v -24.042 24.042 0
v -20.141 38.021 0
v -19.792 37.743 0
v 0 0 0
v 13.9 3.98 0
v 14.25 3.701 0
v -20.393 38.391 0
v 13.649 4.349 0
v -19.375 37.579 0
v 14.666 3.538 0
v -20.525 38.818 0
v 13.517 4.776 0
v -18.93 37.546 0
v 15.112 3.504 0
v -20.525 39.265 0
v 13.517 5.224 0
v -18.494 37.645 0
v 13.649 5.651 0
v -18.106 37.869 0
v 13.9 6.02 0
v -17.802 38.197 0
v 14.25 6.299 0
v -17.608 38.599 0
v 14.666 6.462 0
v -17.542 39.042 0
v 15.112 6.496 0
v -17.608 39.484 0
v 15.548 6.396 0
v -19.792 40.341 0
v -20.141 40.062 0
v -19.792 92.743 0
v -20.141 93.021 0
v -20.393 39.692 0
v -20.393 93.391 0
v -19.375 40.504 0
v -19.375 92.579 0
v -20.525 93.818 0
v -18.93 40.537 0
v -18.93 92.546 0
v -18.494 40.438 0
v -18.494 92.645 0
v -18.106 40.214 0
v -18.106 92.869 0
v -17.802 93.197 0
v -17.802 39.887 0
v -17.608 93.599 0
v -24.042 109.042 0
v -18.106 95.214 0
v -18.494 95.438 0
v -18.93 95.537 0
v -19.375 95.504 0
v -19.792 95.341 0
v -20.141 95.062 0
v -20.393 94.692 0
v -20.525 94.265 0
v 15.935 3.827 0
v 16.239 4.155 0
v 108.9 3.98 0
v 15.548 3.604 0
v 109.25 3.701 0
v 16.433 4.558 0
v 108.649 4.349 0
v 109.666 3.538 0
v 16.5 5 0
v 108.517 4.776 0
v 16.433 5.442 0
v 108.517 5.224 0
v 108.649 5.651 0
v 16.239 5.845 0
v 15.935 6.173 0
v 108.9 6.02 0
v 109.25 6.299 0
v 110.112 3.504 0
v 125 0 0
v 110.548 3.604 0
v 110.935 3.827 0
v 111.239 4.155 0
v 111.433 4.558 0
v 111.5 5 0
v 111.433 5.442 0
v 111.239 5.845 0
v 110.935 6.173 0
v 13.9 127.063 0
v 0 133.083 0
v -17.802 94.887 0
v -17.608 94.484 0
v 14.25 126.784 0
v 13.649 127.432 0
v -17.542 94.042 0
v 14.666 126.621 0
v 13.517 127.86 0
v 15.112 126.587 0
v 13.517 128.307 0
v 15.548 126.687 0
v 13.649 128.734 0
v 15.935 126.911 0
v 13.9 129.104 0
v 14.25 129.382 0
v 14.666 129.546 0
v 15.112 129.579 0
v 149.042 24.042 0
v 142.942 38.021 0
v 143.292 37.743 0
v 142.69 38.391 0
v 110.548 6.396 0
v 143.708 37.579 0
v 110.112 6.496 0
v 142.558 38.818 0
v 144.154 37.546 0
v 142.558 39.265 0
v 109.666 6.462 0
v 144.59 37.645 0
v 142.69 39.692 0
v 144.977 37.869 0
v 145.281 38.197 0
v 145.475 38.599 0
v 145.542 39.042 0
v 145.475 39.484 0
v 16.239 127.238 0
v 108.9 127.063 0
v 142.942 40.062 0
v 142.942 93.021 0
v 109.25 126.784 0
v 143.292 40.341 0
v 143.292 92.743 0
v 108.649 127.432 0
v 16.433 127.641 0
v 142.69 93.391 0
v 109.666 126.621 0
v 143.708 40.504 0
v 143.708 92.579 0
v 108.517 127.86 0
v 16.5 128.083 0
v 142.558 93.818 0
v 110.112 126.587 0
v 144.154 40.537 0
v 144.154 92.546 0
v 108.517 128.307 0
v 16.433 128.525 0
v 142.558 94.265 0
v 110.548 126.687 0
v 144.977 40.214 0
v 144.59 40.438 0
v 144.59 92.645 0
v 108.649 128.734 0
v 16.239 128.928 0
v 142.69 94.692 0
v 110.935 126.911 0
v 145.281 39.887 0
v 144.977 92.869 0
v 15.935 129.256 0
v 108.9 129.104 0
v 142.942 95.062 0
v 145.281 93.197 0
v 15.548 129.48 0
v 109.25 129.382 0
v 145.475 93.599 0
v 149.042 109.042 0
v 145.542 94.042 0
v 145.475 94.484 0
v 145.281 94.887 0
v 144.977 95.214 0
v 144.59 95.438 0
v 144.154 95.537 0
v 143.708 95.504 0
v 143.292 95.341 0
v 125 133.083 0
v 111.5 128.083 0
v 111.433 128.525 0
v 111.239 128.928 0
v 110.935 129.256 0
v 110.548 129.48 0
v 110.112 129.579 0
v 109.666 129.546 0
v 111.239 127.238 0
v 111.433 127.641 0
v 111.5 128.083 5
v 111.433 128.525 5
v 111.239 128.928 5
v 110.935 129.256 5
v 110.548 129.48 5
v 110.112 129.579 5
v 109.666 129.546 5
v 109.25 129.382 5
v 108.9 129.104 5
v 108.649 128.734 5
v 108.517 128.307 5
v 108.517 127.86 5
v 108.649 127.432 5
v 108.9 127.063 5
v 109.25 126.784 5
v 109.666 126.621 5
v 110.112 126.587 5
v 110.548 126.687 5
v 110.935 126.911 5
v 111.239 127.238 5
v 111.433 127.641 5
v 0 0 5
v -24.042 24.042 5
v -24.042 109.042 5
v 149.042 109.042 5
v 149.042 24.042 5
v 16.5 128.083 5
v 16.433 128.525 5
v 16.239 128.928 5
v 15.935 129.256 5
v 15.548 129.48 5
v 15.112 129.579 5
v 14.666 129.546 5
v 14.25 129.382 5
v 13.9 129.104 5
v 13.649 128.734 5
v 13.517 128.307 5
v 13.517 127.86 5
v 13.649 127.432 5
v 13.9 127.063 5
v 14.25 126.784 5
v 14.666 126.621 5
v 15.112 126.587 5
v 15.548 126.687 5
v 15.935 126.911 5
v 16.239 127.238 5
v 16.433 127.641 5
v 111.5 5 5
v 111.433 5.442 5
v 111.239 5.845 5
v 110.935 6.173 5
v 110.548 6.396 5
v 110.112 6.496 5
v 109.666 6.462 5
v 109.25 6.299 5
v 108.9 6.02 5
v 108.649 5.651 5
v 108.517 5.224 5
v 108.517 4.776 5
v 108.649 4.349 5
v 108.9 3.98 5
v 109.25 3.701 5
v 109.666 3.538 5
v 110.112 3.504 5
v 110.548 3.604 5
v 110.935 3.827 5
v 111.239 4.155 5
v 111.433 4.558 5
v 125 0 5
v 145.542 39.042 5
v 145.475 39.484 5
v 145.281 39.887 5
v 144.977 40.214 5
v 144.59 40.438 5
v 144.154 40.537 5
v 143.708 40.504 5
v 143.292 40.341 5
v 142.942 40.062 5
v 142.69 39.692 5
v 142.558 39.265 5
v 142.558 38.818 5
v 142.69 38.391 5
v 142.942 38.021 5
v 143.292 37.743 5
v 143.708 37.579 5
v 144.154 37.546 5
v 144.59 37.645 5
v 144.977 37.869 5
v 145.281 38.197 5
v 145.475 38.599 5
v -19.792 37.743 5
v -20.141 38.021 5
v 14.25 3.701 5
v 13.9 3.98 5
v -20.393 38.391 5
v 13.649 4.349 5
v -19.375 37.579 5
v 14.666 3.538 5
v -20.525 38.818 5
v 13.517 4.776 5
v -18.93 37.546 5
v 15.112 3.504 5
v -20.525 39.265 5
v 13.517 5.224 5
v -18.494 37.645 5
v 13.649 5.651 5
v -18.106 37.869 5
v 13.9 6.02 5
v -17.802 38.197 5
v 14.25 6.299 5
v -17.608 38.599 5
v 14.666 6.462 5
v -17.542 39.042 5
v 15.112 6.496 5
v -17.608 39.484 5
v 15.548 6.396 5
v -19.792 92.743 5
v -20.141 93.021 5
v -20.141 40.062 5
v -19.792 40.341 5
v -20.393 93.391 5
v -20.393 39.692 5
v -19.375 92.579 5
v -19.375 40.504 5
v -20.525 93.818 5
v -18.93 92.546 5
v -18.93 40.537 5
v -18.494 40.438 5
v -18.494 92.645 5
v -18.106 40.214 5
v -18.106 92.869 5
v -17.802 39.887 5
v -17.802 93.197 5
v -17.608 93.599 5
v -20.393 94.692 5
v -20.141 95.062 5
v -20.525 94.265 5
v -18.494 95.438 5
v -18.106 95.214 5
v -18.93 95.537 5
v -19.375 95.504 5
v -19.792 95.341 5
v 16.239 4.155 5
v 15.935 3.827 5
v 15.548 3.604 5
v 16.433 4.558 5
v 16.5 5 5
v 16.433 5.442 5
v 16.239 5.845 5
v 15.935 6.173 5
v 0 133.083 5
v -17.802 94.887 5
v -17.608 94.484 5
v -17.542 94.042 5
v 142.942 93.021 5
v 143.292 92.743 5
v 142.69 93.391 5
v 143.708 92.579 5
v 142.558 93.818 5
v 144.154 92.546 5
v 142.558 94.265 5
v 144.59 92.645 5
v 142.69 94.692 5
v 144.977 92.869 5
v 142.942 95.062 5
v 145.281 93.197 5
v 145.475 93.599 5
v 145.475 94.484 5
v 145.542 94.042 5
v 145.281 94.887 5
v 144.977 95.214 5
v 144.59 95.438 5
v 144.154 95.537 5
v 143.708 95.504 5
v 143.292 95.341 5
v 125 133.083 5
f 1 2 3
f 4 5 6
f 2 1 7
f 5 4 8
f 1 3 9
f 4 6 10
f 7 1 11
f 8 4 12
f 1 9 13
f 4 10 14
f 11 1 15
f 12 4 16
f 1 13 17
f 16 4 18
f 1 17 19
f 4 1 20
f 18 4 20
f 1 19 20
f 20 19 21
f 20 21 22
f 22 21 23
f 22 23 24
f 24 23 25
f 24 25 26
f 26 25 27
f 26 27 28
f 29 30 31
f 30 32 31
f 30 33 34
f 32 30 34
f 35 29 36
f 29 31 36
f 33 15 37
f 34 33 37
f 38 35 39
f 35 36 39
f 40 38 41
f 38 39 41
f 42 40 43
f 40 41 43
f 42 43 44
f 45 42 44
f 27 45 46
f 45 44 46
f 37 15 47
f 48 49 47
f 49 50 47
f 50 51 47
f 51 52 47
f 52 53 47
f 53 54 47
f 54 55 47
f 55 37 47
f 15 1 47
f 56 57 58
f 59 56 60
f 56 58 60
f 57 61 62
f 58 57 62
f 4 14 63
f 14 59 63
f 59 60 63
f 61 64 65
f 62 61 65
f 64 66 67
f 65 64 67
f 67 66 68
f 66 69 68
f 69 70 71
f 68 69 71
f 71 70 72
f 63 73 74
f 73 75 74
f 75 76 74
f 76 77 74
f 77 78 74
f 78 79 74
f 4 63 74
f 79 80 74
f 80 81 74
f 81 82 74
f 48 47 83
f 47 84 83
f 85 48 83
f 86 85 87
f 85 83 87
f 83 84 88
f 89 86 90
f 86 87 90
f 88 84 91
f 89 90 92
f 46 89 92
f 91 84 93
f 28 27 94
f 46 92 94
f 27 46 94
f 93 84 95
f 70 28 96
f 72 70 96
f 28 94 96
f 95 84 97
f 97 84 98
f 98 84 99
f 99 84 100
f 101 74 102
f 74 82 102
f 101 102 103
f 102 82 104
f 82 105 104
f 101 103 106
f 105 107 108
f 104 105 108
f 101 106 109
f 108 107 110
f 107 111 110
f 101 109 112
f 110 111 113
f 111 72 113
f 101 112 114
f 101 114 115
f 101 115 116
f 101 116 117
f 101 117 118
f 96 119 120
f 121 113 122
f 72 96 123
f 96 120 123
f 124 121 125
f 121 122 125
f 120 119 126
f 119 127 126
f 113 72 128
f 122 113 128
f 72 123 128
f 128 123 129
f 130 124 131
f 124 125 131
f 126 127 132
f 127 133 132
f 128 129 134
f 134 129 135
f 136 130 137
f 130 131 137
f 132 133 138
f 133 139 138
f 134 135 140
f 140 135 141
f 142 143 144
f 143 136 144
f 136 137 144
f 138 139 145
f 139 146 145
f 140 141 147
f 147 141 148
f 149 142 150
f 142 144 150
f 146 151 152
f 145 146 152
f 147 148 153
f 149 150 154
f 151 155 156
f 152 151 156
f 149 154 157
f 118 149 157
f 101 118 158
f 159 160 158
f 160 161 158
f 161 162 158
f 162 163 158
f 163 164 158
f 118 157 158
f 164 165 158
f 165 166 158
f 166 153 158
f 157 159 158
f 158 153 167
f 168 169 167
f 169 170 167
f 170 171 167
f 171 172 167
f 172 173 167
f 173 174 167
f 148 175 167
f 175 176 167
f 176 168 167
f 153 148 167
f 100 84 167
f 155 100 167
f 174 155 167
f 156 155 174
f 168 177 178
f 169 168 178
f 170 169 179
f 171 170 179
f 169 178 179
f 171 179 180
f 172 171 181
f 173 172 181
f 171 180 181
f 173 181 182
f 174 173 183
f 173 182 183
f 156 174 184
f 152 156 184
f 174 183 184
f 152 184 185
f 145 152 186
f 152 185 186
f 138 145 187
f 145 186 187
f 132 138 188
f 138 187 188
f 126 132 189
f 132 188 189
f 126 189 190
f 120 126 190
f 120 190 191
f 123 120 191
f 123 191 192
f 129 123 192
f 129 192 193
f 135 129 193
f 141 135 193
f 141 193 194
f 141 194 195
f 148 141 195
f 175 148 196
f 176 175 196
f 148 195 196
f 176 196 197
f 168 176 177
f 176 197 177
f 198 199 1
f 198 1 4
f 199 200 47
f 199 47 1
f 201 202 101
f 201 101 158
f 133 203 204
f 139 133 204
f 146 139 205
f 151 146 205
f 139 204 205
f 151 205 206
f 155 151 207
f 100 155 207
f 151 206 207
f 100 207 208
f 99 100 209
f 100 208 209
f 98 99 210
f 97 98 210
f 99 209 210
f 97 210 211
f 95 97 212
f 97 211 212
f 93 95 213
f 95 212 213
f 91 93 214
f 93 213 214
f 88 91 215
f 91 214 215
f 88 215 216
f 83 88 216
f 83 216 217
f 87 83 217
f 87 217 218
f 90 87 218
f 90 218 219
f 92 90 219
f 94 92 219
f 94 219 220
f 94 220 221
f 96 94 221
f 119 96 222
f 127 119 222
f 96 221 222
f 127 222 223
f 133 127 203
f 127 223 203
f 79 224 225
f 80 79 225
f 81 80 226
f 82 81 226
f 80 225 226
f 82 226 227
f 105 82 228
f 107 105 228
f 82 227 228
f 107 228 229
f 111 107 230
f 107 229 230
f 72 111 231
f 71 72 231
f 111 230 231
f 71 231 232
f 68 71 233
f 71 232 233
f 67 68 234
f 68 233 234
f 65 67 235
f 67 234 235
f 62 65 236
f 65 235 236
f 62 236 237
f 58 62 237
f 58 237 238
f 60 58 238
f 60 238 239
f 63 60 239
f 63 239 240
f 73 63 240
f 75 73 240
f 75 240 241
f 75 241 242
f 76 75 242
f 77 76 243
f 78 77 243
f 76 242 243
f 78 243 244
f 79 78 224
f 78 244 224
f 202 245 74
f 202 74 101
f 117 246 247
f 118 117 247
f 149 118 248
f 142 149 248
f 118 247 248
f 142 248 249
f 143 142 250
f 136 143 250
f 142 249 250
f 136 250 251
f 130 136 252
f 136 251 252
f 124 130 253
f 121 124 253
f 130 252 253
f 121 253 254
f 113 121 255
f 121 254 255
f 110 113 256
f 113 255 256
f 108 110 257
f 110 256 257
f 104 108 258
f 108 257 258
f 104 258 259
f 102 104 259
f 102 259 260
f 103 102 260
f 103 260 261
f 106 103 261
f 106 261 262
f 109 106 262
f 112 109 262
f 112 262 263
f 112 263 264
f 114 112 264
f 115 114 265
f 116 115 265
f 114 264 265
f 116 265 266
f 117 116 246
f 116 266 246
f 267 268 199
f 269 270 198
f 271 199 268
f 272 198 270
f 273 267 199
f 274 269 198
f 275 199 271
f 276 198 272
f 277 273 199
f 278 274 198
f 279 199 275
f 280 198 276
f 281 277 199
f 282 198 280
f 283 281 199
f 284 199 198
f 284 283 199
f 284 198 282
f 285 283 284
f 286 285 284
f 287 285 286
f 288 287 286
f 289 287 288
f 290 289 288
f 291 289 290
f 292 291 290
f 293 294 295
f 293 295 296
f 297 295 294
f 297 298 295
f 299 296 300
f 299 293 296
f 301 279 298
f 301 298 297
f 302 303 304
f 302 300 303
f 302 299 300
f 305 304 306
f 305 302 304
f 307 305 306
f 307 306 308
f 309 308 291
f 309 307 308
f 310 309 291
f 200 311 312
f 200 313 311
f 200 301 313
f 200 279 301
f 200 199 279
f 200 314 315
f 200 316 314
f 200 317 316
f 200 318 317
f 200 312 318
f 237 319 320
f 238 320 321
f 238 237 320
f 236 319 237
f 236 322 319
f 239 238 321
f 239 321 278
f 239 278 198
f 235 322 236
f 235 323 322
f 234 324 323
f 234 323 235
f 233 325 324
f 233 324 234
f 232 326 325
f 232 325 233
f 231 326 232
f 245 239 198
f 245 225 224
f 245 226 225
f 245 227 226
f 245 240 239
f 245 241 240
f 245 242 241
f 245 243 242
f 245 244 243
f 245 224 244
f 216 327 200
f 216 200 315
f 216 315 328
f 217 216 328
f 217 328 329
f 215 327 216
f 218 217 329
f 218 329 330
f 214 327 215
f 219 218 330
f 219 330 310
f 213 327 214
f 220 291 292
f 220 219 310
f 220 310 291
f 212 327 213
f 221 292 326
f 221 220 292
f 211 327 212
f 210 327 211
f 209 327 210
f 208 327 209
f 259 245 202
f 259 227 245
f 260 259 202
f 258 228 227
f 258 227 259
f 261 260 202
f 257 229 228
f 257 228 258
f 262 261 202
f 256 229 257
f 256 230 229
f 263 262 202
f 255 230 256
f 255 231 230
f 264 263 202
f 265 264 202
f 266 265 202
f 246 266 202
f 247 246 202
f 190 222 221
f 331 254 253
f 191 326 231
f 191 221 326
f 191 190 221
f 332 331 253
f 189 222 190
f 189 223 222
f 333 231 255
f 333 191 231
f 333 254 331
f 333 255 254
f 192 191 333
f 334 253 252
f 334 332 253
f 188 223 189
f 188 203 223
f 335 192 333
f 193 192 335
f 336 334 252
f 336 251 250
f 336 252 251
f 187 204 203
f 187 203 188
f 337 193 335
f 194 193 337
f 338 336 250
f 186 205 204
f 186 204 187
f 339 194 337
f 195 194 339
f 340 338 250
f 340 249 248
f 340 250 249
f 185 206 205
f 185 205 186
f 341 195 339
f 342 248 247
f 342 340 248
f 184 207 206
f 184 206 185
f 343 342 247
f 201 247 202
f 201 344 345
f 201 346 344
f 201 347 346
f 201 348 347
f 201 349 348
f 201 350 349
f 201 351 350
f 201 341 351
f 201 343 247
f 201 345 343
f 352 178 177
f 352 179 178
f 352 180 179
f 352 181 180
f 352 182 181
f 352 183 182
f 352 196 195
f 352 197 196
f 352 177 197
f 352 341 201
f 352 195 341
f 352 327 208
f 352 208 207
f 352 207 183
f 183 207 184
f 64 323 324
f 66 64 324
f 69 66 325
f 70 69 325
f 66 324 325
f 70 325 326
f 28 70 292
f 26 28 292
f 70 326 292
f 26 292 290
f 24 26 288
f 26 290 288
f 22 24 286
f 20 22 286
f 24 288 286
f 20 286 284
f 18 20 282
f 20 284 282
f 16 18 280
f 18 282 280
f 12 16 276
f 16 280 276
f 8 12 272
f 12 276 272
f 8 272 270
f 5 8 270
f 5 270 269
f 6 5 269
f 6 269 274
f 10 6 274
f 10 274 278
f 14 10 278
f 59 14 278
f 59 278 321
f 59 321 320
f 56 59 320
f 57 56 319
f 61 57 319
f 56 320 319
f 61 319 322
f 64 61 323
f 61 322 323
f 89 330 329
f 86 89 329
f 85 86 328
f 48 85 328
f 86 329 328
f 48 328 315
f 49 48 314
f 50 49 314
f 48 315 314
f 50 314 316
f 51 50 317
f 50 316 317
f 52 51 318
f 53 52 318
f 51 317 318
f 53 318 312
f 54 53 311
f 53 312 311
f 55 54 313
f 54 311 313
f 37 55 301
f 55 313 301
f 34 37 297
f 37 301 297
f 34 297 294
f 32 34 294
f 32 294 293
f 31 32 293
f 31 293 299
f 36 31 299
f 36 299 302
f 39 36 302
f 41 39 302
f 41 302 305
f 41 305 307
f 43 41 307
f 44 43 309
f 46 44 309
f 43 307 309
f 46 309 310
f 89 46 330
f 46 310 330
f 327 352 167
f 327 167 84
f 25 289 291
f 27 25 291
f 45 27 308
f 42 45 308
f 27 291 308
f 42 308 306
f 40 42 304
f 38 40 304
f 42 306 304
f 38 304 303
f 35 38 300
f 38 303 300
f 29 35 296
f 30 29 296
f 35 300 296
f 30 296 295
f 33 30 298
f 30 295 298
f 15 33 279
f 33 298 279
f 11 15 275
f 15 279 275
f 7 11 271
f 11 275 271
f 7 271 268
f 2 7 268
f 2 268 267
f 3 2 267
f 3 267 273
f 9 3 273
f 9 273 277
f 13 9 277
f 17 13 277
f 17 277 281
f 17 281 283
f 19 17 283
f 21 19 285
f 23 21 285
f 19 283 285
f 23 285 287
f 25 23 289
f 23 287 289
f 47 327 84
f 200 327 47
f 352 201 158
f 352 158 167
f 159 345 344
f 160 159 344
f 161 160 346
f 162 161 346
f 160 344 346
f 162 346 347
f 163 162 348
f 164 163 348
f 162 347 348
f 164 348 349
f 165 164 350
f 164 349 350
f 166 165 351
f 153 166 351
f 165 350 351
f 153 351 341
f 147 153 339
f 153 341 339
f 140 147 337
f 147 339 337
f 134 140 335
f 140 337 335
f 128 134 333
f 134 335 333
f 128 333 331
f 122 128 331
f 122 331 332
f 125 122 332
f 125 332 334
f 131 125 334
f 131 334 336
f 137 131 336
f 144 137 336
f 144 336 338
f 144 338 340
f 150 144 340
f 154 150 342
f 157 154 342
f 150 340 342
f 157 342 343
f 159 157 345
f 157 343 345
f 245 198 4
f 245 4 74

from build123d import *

# Parameters (mm, degrees)
SKETCH1_R             = 2.1
SKETCH1_R_2           = 1.5
BOSS_EXTRUDE1_DEPTH   = 5
DELETEFACE1_OUTLINE_R = 2.1
DELETEFACE1_DEPTH     = 5


# Read off the part's stored shape, not the designer's step: DeleteFace1
with BuildPart() as part:
    # Sketch1 → Boss-Extrude1 (new body)
    with BuildSketch(Plane.XY.offset(5)):
        Polygon((-24.04163056, 24.04163056), (0, 0), (125, 0), (149.04163056, 24.04163056), (149.04163056, 109.04163056), (125, 133.083261121), (0, 133.083261121), (-24.04163056, 109.04163056), align=None)
        with Locations((118.731419269, 101.776120312)):
            Circle(SKETCH1_R, mode=Mode.SUBTRACT)
        with Locations((78.347048523, 57.984145877)):
            Circle(SKETCH1_R, mode=Mode.SUBTRACT)
        with Locations((53.279835174, 85.131070757)):
            Circle(SKETCH1_R, mode=Mode.SUBTRACT)
        with Locations((46.652951477, 57.984145877)):
            Circle(SKETCH1_R, mode=Mode.SUBTRACT)
        with Locations((6.268580731, 31.307140809)):
            Circle(SKETCH1_R, mode=Mode.SUBTRACT)
        with Locations((6.268580731, 101.776120312)):
            Circle(SKETCH1_R, mode=Mode.SUBTRACT)
        with Locations((71.720164826, 47.952190364)):
            Circle(SKETCH1_R, mode=Mode.SUBTRACT)
        with Locations((78.347048523, 75.099115243)):
            Circle(SKETCH1_R, mode=Mode.SUBTRACT)
        with Locations((112.104535572, 111.808075826)):
            Circle(SKETCH1_R, mode=Mode.SUBTRACT)
        with Locations((118.731419269, 31.307140809)):
            Circle(SKETCH1_R, mode=Mode.SUBTRACT)
        with Locations((46.652951477, 75.099115243)):
            Circle(SKETCH1_R, mode=Mode.SUBTRACT)
        with Locations((53.279835174, 47.952190364)):
            Circle(SKETCH1_R, mode=Mode.SUBTRACT)
        with Locations((12.895464428, 21.275185295)):
            Circle(SKETCH1_R, mode=Mode.SUBTRACT)
        with Locations((12.895464428, 111.808075826)):
            Circle(SKETCH1_R, mode=Mode.SUBTRACT)
        with Locations((112.104535572, 21.275185295)):
            Circle(SKETCH1_R, mode=Mode.SUBTRACT)
        with Locations((71.720164826, 85.131070757)):
            Circle(SKETCH1_R, mode=Mode.SUBTRACT)
        with Locations((144.041630486, 94.041630337)):
            Circle(SKETCH1_R_2, mode=Mode.SUBTRACT)
        with Locations((-19.041630486, 39.041630784)):
            Circle(SKETCH1_R_2, mode=Mode.SUBTRACT)
        with Locations((144.041630486, 39.041630784)):
            Circle(SKETCH1_R_2, mode=Mode.SUBTRACT)
        with Locations((15.000000224, 5.000000075)):
            Circle(SKETCH1_R_2, mode=Mode.SUBTRACT)
        with Locations((109.999999776, 5.000000075)):
            Circle(SKETCH1_R_2, mode=Mode.SUBTRACT)
        with Locations((109.999999776, 128.083261046)):
            Circle(SKETCH1_R_2, mode=Mode.SUBTRACT)
        with Locations((15.000000224, 128.083261046)):
            Circle(SKETCH1_R_2, mode=Mode.SUBTRACT)
        with Locations((-19.041630486, 94.041630337)):
            Circle(SKETCH1_R_2, mode=Mode.SUBTRACT)
        Polygon((4.803542307, 37.516408095), (41.516606622, 61.768230885), (54.744873598, 41.742923077), (18.031809283, 17.491100287), align=None, mode=Mode.SUBTRACT)
        Polygon((18.031809283, 115.592160833), (54.744873598, 91.340338044), (41.516606622, 71.315030236), (4.803542307, 95.566853025), align=None, mode=Mode.SUBTRACT)
        Polygon((70.255126402, 41.742923077), (83.483393378, 61.768230885), (120.196457693, 37.516408095), (106.968190717, 17.491100287), align=None, mode=Mode.SUBTRACT)
        Polygon((83.483393378, 71.315030236), (70.255126402, 91.340338044), (106.968190717, 115.592160833), (120.196457693, 95.566853025), align=None, mode=Mode.SUBTRACT)
    extrude(amount=-BOSS_EXTRUDE1_DEPTH)

    # DeleteFace1 outline → DeleteFace1 (add)
    with BuildSketch(Plane.XY):
        Polygon((41.516606622, 61.768230885), (4.803542307, 37.516408095), (18.031809283, 17.491100287), (54.744873598, 41.742923077), align=None)
        Polygon((54.744873598, 91.340338044), (18.031809283, 115.592160833), (4.803542307, 95.566853025), (41.516606622, 71.315030236), align=None)
        Polygon((83.483393378, 61.768230885), (70.255126402, 41.742923077), (106.968190717, 17.491100287), (120.196457693, 37.516408095), align=None)
        Polygon((70.255126402, 91.340338044), (83.483393378, 71.315030236), (120.196457693, 95.566853025), (106.968190717, 115.592160833), align=None)
        with Locations((118.731419269, 101.776120312)):
            Circle(DELETEFACE1_OUTLINE_R)
        with Locations((78.347048523, 57.984145877)):
            Circle(DELETEFACE1_OUTLINE_R)
        with Locations((53.279835174, 85.131070757)):
            Circle(DELETEFACE1_OUTLINE_R)
        with Locations((46.652951477, 57.984145877)):
            Circle(DELETEFACE1_OUTLINE_R)
        with Locations((6.268580731, 31.307140809)):
            Circle(DELETEFACE1_OUTLINE_R)
        with Locations((6.268580731, 101.776120312)):
            Circle(DELETEFACE1_OUTLINE_R)
        with Locations((71.720164826, 47.952190364)):
            Circle(DELETEFACE1_OUTLINE_R)
        with Locations((78.347048523, 75.099115243)):
            Circle(DELETEFACE1_OUTLINE_R)
        with Locations((112.104535572, 111.808075826)):
            Circle(DELETEFACE1_OUTLINE_R)
        with Locations((118.731419269, 31.307140809)):
            Circle(DELETEFACE1_OUTLINE_R)
        with Locations((46.652951477, 75.099115243)):
            Circle(DELETEFACE1_OUTLINE_R)
        with Locations((53.279835174, 47.952190364)):
            Circle(DELETEFACE1_OUTLINE_R)
        with Locations((12.895464428, 21.275185295)):
            Circle(DELETEFACE1_OUTLINE_R)
        with Locations((12.895464428, 111.808075826)):
            Circle(DELETEFACE1_OUTLINE_R)
        with Locations((112.104535572, 21.275185295)):
            Circle(DELETEFACE1_OUTLINE_R)
        with Locations((71.720164826, 85.131070757)):
            Circle(DELETEFACE1_OUTLINE_R)
    extrude(amount=DELETEFACE1_DEPTH)


solid = part.part
